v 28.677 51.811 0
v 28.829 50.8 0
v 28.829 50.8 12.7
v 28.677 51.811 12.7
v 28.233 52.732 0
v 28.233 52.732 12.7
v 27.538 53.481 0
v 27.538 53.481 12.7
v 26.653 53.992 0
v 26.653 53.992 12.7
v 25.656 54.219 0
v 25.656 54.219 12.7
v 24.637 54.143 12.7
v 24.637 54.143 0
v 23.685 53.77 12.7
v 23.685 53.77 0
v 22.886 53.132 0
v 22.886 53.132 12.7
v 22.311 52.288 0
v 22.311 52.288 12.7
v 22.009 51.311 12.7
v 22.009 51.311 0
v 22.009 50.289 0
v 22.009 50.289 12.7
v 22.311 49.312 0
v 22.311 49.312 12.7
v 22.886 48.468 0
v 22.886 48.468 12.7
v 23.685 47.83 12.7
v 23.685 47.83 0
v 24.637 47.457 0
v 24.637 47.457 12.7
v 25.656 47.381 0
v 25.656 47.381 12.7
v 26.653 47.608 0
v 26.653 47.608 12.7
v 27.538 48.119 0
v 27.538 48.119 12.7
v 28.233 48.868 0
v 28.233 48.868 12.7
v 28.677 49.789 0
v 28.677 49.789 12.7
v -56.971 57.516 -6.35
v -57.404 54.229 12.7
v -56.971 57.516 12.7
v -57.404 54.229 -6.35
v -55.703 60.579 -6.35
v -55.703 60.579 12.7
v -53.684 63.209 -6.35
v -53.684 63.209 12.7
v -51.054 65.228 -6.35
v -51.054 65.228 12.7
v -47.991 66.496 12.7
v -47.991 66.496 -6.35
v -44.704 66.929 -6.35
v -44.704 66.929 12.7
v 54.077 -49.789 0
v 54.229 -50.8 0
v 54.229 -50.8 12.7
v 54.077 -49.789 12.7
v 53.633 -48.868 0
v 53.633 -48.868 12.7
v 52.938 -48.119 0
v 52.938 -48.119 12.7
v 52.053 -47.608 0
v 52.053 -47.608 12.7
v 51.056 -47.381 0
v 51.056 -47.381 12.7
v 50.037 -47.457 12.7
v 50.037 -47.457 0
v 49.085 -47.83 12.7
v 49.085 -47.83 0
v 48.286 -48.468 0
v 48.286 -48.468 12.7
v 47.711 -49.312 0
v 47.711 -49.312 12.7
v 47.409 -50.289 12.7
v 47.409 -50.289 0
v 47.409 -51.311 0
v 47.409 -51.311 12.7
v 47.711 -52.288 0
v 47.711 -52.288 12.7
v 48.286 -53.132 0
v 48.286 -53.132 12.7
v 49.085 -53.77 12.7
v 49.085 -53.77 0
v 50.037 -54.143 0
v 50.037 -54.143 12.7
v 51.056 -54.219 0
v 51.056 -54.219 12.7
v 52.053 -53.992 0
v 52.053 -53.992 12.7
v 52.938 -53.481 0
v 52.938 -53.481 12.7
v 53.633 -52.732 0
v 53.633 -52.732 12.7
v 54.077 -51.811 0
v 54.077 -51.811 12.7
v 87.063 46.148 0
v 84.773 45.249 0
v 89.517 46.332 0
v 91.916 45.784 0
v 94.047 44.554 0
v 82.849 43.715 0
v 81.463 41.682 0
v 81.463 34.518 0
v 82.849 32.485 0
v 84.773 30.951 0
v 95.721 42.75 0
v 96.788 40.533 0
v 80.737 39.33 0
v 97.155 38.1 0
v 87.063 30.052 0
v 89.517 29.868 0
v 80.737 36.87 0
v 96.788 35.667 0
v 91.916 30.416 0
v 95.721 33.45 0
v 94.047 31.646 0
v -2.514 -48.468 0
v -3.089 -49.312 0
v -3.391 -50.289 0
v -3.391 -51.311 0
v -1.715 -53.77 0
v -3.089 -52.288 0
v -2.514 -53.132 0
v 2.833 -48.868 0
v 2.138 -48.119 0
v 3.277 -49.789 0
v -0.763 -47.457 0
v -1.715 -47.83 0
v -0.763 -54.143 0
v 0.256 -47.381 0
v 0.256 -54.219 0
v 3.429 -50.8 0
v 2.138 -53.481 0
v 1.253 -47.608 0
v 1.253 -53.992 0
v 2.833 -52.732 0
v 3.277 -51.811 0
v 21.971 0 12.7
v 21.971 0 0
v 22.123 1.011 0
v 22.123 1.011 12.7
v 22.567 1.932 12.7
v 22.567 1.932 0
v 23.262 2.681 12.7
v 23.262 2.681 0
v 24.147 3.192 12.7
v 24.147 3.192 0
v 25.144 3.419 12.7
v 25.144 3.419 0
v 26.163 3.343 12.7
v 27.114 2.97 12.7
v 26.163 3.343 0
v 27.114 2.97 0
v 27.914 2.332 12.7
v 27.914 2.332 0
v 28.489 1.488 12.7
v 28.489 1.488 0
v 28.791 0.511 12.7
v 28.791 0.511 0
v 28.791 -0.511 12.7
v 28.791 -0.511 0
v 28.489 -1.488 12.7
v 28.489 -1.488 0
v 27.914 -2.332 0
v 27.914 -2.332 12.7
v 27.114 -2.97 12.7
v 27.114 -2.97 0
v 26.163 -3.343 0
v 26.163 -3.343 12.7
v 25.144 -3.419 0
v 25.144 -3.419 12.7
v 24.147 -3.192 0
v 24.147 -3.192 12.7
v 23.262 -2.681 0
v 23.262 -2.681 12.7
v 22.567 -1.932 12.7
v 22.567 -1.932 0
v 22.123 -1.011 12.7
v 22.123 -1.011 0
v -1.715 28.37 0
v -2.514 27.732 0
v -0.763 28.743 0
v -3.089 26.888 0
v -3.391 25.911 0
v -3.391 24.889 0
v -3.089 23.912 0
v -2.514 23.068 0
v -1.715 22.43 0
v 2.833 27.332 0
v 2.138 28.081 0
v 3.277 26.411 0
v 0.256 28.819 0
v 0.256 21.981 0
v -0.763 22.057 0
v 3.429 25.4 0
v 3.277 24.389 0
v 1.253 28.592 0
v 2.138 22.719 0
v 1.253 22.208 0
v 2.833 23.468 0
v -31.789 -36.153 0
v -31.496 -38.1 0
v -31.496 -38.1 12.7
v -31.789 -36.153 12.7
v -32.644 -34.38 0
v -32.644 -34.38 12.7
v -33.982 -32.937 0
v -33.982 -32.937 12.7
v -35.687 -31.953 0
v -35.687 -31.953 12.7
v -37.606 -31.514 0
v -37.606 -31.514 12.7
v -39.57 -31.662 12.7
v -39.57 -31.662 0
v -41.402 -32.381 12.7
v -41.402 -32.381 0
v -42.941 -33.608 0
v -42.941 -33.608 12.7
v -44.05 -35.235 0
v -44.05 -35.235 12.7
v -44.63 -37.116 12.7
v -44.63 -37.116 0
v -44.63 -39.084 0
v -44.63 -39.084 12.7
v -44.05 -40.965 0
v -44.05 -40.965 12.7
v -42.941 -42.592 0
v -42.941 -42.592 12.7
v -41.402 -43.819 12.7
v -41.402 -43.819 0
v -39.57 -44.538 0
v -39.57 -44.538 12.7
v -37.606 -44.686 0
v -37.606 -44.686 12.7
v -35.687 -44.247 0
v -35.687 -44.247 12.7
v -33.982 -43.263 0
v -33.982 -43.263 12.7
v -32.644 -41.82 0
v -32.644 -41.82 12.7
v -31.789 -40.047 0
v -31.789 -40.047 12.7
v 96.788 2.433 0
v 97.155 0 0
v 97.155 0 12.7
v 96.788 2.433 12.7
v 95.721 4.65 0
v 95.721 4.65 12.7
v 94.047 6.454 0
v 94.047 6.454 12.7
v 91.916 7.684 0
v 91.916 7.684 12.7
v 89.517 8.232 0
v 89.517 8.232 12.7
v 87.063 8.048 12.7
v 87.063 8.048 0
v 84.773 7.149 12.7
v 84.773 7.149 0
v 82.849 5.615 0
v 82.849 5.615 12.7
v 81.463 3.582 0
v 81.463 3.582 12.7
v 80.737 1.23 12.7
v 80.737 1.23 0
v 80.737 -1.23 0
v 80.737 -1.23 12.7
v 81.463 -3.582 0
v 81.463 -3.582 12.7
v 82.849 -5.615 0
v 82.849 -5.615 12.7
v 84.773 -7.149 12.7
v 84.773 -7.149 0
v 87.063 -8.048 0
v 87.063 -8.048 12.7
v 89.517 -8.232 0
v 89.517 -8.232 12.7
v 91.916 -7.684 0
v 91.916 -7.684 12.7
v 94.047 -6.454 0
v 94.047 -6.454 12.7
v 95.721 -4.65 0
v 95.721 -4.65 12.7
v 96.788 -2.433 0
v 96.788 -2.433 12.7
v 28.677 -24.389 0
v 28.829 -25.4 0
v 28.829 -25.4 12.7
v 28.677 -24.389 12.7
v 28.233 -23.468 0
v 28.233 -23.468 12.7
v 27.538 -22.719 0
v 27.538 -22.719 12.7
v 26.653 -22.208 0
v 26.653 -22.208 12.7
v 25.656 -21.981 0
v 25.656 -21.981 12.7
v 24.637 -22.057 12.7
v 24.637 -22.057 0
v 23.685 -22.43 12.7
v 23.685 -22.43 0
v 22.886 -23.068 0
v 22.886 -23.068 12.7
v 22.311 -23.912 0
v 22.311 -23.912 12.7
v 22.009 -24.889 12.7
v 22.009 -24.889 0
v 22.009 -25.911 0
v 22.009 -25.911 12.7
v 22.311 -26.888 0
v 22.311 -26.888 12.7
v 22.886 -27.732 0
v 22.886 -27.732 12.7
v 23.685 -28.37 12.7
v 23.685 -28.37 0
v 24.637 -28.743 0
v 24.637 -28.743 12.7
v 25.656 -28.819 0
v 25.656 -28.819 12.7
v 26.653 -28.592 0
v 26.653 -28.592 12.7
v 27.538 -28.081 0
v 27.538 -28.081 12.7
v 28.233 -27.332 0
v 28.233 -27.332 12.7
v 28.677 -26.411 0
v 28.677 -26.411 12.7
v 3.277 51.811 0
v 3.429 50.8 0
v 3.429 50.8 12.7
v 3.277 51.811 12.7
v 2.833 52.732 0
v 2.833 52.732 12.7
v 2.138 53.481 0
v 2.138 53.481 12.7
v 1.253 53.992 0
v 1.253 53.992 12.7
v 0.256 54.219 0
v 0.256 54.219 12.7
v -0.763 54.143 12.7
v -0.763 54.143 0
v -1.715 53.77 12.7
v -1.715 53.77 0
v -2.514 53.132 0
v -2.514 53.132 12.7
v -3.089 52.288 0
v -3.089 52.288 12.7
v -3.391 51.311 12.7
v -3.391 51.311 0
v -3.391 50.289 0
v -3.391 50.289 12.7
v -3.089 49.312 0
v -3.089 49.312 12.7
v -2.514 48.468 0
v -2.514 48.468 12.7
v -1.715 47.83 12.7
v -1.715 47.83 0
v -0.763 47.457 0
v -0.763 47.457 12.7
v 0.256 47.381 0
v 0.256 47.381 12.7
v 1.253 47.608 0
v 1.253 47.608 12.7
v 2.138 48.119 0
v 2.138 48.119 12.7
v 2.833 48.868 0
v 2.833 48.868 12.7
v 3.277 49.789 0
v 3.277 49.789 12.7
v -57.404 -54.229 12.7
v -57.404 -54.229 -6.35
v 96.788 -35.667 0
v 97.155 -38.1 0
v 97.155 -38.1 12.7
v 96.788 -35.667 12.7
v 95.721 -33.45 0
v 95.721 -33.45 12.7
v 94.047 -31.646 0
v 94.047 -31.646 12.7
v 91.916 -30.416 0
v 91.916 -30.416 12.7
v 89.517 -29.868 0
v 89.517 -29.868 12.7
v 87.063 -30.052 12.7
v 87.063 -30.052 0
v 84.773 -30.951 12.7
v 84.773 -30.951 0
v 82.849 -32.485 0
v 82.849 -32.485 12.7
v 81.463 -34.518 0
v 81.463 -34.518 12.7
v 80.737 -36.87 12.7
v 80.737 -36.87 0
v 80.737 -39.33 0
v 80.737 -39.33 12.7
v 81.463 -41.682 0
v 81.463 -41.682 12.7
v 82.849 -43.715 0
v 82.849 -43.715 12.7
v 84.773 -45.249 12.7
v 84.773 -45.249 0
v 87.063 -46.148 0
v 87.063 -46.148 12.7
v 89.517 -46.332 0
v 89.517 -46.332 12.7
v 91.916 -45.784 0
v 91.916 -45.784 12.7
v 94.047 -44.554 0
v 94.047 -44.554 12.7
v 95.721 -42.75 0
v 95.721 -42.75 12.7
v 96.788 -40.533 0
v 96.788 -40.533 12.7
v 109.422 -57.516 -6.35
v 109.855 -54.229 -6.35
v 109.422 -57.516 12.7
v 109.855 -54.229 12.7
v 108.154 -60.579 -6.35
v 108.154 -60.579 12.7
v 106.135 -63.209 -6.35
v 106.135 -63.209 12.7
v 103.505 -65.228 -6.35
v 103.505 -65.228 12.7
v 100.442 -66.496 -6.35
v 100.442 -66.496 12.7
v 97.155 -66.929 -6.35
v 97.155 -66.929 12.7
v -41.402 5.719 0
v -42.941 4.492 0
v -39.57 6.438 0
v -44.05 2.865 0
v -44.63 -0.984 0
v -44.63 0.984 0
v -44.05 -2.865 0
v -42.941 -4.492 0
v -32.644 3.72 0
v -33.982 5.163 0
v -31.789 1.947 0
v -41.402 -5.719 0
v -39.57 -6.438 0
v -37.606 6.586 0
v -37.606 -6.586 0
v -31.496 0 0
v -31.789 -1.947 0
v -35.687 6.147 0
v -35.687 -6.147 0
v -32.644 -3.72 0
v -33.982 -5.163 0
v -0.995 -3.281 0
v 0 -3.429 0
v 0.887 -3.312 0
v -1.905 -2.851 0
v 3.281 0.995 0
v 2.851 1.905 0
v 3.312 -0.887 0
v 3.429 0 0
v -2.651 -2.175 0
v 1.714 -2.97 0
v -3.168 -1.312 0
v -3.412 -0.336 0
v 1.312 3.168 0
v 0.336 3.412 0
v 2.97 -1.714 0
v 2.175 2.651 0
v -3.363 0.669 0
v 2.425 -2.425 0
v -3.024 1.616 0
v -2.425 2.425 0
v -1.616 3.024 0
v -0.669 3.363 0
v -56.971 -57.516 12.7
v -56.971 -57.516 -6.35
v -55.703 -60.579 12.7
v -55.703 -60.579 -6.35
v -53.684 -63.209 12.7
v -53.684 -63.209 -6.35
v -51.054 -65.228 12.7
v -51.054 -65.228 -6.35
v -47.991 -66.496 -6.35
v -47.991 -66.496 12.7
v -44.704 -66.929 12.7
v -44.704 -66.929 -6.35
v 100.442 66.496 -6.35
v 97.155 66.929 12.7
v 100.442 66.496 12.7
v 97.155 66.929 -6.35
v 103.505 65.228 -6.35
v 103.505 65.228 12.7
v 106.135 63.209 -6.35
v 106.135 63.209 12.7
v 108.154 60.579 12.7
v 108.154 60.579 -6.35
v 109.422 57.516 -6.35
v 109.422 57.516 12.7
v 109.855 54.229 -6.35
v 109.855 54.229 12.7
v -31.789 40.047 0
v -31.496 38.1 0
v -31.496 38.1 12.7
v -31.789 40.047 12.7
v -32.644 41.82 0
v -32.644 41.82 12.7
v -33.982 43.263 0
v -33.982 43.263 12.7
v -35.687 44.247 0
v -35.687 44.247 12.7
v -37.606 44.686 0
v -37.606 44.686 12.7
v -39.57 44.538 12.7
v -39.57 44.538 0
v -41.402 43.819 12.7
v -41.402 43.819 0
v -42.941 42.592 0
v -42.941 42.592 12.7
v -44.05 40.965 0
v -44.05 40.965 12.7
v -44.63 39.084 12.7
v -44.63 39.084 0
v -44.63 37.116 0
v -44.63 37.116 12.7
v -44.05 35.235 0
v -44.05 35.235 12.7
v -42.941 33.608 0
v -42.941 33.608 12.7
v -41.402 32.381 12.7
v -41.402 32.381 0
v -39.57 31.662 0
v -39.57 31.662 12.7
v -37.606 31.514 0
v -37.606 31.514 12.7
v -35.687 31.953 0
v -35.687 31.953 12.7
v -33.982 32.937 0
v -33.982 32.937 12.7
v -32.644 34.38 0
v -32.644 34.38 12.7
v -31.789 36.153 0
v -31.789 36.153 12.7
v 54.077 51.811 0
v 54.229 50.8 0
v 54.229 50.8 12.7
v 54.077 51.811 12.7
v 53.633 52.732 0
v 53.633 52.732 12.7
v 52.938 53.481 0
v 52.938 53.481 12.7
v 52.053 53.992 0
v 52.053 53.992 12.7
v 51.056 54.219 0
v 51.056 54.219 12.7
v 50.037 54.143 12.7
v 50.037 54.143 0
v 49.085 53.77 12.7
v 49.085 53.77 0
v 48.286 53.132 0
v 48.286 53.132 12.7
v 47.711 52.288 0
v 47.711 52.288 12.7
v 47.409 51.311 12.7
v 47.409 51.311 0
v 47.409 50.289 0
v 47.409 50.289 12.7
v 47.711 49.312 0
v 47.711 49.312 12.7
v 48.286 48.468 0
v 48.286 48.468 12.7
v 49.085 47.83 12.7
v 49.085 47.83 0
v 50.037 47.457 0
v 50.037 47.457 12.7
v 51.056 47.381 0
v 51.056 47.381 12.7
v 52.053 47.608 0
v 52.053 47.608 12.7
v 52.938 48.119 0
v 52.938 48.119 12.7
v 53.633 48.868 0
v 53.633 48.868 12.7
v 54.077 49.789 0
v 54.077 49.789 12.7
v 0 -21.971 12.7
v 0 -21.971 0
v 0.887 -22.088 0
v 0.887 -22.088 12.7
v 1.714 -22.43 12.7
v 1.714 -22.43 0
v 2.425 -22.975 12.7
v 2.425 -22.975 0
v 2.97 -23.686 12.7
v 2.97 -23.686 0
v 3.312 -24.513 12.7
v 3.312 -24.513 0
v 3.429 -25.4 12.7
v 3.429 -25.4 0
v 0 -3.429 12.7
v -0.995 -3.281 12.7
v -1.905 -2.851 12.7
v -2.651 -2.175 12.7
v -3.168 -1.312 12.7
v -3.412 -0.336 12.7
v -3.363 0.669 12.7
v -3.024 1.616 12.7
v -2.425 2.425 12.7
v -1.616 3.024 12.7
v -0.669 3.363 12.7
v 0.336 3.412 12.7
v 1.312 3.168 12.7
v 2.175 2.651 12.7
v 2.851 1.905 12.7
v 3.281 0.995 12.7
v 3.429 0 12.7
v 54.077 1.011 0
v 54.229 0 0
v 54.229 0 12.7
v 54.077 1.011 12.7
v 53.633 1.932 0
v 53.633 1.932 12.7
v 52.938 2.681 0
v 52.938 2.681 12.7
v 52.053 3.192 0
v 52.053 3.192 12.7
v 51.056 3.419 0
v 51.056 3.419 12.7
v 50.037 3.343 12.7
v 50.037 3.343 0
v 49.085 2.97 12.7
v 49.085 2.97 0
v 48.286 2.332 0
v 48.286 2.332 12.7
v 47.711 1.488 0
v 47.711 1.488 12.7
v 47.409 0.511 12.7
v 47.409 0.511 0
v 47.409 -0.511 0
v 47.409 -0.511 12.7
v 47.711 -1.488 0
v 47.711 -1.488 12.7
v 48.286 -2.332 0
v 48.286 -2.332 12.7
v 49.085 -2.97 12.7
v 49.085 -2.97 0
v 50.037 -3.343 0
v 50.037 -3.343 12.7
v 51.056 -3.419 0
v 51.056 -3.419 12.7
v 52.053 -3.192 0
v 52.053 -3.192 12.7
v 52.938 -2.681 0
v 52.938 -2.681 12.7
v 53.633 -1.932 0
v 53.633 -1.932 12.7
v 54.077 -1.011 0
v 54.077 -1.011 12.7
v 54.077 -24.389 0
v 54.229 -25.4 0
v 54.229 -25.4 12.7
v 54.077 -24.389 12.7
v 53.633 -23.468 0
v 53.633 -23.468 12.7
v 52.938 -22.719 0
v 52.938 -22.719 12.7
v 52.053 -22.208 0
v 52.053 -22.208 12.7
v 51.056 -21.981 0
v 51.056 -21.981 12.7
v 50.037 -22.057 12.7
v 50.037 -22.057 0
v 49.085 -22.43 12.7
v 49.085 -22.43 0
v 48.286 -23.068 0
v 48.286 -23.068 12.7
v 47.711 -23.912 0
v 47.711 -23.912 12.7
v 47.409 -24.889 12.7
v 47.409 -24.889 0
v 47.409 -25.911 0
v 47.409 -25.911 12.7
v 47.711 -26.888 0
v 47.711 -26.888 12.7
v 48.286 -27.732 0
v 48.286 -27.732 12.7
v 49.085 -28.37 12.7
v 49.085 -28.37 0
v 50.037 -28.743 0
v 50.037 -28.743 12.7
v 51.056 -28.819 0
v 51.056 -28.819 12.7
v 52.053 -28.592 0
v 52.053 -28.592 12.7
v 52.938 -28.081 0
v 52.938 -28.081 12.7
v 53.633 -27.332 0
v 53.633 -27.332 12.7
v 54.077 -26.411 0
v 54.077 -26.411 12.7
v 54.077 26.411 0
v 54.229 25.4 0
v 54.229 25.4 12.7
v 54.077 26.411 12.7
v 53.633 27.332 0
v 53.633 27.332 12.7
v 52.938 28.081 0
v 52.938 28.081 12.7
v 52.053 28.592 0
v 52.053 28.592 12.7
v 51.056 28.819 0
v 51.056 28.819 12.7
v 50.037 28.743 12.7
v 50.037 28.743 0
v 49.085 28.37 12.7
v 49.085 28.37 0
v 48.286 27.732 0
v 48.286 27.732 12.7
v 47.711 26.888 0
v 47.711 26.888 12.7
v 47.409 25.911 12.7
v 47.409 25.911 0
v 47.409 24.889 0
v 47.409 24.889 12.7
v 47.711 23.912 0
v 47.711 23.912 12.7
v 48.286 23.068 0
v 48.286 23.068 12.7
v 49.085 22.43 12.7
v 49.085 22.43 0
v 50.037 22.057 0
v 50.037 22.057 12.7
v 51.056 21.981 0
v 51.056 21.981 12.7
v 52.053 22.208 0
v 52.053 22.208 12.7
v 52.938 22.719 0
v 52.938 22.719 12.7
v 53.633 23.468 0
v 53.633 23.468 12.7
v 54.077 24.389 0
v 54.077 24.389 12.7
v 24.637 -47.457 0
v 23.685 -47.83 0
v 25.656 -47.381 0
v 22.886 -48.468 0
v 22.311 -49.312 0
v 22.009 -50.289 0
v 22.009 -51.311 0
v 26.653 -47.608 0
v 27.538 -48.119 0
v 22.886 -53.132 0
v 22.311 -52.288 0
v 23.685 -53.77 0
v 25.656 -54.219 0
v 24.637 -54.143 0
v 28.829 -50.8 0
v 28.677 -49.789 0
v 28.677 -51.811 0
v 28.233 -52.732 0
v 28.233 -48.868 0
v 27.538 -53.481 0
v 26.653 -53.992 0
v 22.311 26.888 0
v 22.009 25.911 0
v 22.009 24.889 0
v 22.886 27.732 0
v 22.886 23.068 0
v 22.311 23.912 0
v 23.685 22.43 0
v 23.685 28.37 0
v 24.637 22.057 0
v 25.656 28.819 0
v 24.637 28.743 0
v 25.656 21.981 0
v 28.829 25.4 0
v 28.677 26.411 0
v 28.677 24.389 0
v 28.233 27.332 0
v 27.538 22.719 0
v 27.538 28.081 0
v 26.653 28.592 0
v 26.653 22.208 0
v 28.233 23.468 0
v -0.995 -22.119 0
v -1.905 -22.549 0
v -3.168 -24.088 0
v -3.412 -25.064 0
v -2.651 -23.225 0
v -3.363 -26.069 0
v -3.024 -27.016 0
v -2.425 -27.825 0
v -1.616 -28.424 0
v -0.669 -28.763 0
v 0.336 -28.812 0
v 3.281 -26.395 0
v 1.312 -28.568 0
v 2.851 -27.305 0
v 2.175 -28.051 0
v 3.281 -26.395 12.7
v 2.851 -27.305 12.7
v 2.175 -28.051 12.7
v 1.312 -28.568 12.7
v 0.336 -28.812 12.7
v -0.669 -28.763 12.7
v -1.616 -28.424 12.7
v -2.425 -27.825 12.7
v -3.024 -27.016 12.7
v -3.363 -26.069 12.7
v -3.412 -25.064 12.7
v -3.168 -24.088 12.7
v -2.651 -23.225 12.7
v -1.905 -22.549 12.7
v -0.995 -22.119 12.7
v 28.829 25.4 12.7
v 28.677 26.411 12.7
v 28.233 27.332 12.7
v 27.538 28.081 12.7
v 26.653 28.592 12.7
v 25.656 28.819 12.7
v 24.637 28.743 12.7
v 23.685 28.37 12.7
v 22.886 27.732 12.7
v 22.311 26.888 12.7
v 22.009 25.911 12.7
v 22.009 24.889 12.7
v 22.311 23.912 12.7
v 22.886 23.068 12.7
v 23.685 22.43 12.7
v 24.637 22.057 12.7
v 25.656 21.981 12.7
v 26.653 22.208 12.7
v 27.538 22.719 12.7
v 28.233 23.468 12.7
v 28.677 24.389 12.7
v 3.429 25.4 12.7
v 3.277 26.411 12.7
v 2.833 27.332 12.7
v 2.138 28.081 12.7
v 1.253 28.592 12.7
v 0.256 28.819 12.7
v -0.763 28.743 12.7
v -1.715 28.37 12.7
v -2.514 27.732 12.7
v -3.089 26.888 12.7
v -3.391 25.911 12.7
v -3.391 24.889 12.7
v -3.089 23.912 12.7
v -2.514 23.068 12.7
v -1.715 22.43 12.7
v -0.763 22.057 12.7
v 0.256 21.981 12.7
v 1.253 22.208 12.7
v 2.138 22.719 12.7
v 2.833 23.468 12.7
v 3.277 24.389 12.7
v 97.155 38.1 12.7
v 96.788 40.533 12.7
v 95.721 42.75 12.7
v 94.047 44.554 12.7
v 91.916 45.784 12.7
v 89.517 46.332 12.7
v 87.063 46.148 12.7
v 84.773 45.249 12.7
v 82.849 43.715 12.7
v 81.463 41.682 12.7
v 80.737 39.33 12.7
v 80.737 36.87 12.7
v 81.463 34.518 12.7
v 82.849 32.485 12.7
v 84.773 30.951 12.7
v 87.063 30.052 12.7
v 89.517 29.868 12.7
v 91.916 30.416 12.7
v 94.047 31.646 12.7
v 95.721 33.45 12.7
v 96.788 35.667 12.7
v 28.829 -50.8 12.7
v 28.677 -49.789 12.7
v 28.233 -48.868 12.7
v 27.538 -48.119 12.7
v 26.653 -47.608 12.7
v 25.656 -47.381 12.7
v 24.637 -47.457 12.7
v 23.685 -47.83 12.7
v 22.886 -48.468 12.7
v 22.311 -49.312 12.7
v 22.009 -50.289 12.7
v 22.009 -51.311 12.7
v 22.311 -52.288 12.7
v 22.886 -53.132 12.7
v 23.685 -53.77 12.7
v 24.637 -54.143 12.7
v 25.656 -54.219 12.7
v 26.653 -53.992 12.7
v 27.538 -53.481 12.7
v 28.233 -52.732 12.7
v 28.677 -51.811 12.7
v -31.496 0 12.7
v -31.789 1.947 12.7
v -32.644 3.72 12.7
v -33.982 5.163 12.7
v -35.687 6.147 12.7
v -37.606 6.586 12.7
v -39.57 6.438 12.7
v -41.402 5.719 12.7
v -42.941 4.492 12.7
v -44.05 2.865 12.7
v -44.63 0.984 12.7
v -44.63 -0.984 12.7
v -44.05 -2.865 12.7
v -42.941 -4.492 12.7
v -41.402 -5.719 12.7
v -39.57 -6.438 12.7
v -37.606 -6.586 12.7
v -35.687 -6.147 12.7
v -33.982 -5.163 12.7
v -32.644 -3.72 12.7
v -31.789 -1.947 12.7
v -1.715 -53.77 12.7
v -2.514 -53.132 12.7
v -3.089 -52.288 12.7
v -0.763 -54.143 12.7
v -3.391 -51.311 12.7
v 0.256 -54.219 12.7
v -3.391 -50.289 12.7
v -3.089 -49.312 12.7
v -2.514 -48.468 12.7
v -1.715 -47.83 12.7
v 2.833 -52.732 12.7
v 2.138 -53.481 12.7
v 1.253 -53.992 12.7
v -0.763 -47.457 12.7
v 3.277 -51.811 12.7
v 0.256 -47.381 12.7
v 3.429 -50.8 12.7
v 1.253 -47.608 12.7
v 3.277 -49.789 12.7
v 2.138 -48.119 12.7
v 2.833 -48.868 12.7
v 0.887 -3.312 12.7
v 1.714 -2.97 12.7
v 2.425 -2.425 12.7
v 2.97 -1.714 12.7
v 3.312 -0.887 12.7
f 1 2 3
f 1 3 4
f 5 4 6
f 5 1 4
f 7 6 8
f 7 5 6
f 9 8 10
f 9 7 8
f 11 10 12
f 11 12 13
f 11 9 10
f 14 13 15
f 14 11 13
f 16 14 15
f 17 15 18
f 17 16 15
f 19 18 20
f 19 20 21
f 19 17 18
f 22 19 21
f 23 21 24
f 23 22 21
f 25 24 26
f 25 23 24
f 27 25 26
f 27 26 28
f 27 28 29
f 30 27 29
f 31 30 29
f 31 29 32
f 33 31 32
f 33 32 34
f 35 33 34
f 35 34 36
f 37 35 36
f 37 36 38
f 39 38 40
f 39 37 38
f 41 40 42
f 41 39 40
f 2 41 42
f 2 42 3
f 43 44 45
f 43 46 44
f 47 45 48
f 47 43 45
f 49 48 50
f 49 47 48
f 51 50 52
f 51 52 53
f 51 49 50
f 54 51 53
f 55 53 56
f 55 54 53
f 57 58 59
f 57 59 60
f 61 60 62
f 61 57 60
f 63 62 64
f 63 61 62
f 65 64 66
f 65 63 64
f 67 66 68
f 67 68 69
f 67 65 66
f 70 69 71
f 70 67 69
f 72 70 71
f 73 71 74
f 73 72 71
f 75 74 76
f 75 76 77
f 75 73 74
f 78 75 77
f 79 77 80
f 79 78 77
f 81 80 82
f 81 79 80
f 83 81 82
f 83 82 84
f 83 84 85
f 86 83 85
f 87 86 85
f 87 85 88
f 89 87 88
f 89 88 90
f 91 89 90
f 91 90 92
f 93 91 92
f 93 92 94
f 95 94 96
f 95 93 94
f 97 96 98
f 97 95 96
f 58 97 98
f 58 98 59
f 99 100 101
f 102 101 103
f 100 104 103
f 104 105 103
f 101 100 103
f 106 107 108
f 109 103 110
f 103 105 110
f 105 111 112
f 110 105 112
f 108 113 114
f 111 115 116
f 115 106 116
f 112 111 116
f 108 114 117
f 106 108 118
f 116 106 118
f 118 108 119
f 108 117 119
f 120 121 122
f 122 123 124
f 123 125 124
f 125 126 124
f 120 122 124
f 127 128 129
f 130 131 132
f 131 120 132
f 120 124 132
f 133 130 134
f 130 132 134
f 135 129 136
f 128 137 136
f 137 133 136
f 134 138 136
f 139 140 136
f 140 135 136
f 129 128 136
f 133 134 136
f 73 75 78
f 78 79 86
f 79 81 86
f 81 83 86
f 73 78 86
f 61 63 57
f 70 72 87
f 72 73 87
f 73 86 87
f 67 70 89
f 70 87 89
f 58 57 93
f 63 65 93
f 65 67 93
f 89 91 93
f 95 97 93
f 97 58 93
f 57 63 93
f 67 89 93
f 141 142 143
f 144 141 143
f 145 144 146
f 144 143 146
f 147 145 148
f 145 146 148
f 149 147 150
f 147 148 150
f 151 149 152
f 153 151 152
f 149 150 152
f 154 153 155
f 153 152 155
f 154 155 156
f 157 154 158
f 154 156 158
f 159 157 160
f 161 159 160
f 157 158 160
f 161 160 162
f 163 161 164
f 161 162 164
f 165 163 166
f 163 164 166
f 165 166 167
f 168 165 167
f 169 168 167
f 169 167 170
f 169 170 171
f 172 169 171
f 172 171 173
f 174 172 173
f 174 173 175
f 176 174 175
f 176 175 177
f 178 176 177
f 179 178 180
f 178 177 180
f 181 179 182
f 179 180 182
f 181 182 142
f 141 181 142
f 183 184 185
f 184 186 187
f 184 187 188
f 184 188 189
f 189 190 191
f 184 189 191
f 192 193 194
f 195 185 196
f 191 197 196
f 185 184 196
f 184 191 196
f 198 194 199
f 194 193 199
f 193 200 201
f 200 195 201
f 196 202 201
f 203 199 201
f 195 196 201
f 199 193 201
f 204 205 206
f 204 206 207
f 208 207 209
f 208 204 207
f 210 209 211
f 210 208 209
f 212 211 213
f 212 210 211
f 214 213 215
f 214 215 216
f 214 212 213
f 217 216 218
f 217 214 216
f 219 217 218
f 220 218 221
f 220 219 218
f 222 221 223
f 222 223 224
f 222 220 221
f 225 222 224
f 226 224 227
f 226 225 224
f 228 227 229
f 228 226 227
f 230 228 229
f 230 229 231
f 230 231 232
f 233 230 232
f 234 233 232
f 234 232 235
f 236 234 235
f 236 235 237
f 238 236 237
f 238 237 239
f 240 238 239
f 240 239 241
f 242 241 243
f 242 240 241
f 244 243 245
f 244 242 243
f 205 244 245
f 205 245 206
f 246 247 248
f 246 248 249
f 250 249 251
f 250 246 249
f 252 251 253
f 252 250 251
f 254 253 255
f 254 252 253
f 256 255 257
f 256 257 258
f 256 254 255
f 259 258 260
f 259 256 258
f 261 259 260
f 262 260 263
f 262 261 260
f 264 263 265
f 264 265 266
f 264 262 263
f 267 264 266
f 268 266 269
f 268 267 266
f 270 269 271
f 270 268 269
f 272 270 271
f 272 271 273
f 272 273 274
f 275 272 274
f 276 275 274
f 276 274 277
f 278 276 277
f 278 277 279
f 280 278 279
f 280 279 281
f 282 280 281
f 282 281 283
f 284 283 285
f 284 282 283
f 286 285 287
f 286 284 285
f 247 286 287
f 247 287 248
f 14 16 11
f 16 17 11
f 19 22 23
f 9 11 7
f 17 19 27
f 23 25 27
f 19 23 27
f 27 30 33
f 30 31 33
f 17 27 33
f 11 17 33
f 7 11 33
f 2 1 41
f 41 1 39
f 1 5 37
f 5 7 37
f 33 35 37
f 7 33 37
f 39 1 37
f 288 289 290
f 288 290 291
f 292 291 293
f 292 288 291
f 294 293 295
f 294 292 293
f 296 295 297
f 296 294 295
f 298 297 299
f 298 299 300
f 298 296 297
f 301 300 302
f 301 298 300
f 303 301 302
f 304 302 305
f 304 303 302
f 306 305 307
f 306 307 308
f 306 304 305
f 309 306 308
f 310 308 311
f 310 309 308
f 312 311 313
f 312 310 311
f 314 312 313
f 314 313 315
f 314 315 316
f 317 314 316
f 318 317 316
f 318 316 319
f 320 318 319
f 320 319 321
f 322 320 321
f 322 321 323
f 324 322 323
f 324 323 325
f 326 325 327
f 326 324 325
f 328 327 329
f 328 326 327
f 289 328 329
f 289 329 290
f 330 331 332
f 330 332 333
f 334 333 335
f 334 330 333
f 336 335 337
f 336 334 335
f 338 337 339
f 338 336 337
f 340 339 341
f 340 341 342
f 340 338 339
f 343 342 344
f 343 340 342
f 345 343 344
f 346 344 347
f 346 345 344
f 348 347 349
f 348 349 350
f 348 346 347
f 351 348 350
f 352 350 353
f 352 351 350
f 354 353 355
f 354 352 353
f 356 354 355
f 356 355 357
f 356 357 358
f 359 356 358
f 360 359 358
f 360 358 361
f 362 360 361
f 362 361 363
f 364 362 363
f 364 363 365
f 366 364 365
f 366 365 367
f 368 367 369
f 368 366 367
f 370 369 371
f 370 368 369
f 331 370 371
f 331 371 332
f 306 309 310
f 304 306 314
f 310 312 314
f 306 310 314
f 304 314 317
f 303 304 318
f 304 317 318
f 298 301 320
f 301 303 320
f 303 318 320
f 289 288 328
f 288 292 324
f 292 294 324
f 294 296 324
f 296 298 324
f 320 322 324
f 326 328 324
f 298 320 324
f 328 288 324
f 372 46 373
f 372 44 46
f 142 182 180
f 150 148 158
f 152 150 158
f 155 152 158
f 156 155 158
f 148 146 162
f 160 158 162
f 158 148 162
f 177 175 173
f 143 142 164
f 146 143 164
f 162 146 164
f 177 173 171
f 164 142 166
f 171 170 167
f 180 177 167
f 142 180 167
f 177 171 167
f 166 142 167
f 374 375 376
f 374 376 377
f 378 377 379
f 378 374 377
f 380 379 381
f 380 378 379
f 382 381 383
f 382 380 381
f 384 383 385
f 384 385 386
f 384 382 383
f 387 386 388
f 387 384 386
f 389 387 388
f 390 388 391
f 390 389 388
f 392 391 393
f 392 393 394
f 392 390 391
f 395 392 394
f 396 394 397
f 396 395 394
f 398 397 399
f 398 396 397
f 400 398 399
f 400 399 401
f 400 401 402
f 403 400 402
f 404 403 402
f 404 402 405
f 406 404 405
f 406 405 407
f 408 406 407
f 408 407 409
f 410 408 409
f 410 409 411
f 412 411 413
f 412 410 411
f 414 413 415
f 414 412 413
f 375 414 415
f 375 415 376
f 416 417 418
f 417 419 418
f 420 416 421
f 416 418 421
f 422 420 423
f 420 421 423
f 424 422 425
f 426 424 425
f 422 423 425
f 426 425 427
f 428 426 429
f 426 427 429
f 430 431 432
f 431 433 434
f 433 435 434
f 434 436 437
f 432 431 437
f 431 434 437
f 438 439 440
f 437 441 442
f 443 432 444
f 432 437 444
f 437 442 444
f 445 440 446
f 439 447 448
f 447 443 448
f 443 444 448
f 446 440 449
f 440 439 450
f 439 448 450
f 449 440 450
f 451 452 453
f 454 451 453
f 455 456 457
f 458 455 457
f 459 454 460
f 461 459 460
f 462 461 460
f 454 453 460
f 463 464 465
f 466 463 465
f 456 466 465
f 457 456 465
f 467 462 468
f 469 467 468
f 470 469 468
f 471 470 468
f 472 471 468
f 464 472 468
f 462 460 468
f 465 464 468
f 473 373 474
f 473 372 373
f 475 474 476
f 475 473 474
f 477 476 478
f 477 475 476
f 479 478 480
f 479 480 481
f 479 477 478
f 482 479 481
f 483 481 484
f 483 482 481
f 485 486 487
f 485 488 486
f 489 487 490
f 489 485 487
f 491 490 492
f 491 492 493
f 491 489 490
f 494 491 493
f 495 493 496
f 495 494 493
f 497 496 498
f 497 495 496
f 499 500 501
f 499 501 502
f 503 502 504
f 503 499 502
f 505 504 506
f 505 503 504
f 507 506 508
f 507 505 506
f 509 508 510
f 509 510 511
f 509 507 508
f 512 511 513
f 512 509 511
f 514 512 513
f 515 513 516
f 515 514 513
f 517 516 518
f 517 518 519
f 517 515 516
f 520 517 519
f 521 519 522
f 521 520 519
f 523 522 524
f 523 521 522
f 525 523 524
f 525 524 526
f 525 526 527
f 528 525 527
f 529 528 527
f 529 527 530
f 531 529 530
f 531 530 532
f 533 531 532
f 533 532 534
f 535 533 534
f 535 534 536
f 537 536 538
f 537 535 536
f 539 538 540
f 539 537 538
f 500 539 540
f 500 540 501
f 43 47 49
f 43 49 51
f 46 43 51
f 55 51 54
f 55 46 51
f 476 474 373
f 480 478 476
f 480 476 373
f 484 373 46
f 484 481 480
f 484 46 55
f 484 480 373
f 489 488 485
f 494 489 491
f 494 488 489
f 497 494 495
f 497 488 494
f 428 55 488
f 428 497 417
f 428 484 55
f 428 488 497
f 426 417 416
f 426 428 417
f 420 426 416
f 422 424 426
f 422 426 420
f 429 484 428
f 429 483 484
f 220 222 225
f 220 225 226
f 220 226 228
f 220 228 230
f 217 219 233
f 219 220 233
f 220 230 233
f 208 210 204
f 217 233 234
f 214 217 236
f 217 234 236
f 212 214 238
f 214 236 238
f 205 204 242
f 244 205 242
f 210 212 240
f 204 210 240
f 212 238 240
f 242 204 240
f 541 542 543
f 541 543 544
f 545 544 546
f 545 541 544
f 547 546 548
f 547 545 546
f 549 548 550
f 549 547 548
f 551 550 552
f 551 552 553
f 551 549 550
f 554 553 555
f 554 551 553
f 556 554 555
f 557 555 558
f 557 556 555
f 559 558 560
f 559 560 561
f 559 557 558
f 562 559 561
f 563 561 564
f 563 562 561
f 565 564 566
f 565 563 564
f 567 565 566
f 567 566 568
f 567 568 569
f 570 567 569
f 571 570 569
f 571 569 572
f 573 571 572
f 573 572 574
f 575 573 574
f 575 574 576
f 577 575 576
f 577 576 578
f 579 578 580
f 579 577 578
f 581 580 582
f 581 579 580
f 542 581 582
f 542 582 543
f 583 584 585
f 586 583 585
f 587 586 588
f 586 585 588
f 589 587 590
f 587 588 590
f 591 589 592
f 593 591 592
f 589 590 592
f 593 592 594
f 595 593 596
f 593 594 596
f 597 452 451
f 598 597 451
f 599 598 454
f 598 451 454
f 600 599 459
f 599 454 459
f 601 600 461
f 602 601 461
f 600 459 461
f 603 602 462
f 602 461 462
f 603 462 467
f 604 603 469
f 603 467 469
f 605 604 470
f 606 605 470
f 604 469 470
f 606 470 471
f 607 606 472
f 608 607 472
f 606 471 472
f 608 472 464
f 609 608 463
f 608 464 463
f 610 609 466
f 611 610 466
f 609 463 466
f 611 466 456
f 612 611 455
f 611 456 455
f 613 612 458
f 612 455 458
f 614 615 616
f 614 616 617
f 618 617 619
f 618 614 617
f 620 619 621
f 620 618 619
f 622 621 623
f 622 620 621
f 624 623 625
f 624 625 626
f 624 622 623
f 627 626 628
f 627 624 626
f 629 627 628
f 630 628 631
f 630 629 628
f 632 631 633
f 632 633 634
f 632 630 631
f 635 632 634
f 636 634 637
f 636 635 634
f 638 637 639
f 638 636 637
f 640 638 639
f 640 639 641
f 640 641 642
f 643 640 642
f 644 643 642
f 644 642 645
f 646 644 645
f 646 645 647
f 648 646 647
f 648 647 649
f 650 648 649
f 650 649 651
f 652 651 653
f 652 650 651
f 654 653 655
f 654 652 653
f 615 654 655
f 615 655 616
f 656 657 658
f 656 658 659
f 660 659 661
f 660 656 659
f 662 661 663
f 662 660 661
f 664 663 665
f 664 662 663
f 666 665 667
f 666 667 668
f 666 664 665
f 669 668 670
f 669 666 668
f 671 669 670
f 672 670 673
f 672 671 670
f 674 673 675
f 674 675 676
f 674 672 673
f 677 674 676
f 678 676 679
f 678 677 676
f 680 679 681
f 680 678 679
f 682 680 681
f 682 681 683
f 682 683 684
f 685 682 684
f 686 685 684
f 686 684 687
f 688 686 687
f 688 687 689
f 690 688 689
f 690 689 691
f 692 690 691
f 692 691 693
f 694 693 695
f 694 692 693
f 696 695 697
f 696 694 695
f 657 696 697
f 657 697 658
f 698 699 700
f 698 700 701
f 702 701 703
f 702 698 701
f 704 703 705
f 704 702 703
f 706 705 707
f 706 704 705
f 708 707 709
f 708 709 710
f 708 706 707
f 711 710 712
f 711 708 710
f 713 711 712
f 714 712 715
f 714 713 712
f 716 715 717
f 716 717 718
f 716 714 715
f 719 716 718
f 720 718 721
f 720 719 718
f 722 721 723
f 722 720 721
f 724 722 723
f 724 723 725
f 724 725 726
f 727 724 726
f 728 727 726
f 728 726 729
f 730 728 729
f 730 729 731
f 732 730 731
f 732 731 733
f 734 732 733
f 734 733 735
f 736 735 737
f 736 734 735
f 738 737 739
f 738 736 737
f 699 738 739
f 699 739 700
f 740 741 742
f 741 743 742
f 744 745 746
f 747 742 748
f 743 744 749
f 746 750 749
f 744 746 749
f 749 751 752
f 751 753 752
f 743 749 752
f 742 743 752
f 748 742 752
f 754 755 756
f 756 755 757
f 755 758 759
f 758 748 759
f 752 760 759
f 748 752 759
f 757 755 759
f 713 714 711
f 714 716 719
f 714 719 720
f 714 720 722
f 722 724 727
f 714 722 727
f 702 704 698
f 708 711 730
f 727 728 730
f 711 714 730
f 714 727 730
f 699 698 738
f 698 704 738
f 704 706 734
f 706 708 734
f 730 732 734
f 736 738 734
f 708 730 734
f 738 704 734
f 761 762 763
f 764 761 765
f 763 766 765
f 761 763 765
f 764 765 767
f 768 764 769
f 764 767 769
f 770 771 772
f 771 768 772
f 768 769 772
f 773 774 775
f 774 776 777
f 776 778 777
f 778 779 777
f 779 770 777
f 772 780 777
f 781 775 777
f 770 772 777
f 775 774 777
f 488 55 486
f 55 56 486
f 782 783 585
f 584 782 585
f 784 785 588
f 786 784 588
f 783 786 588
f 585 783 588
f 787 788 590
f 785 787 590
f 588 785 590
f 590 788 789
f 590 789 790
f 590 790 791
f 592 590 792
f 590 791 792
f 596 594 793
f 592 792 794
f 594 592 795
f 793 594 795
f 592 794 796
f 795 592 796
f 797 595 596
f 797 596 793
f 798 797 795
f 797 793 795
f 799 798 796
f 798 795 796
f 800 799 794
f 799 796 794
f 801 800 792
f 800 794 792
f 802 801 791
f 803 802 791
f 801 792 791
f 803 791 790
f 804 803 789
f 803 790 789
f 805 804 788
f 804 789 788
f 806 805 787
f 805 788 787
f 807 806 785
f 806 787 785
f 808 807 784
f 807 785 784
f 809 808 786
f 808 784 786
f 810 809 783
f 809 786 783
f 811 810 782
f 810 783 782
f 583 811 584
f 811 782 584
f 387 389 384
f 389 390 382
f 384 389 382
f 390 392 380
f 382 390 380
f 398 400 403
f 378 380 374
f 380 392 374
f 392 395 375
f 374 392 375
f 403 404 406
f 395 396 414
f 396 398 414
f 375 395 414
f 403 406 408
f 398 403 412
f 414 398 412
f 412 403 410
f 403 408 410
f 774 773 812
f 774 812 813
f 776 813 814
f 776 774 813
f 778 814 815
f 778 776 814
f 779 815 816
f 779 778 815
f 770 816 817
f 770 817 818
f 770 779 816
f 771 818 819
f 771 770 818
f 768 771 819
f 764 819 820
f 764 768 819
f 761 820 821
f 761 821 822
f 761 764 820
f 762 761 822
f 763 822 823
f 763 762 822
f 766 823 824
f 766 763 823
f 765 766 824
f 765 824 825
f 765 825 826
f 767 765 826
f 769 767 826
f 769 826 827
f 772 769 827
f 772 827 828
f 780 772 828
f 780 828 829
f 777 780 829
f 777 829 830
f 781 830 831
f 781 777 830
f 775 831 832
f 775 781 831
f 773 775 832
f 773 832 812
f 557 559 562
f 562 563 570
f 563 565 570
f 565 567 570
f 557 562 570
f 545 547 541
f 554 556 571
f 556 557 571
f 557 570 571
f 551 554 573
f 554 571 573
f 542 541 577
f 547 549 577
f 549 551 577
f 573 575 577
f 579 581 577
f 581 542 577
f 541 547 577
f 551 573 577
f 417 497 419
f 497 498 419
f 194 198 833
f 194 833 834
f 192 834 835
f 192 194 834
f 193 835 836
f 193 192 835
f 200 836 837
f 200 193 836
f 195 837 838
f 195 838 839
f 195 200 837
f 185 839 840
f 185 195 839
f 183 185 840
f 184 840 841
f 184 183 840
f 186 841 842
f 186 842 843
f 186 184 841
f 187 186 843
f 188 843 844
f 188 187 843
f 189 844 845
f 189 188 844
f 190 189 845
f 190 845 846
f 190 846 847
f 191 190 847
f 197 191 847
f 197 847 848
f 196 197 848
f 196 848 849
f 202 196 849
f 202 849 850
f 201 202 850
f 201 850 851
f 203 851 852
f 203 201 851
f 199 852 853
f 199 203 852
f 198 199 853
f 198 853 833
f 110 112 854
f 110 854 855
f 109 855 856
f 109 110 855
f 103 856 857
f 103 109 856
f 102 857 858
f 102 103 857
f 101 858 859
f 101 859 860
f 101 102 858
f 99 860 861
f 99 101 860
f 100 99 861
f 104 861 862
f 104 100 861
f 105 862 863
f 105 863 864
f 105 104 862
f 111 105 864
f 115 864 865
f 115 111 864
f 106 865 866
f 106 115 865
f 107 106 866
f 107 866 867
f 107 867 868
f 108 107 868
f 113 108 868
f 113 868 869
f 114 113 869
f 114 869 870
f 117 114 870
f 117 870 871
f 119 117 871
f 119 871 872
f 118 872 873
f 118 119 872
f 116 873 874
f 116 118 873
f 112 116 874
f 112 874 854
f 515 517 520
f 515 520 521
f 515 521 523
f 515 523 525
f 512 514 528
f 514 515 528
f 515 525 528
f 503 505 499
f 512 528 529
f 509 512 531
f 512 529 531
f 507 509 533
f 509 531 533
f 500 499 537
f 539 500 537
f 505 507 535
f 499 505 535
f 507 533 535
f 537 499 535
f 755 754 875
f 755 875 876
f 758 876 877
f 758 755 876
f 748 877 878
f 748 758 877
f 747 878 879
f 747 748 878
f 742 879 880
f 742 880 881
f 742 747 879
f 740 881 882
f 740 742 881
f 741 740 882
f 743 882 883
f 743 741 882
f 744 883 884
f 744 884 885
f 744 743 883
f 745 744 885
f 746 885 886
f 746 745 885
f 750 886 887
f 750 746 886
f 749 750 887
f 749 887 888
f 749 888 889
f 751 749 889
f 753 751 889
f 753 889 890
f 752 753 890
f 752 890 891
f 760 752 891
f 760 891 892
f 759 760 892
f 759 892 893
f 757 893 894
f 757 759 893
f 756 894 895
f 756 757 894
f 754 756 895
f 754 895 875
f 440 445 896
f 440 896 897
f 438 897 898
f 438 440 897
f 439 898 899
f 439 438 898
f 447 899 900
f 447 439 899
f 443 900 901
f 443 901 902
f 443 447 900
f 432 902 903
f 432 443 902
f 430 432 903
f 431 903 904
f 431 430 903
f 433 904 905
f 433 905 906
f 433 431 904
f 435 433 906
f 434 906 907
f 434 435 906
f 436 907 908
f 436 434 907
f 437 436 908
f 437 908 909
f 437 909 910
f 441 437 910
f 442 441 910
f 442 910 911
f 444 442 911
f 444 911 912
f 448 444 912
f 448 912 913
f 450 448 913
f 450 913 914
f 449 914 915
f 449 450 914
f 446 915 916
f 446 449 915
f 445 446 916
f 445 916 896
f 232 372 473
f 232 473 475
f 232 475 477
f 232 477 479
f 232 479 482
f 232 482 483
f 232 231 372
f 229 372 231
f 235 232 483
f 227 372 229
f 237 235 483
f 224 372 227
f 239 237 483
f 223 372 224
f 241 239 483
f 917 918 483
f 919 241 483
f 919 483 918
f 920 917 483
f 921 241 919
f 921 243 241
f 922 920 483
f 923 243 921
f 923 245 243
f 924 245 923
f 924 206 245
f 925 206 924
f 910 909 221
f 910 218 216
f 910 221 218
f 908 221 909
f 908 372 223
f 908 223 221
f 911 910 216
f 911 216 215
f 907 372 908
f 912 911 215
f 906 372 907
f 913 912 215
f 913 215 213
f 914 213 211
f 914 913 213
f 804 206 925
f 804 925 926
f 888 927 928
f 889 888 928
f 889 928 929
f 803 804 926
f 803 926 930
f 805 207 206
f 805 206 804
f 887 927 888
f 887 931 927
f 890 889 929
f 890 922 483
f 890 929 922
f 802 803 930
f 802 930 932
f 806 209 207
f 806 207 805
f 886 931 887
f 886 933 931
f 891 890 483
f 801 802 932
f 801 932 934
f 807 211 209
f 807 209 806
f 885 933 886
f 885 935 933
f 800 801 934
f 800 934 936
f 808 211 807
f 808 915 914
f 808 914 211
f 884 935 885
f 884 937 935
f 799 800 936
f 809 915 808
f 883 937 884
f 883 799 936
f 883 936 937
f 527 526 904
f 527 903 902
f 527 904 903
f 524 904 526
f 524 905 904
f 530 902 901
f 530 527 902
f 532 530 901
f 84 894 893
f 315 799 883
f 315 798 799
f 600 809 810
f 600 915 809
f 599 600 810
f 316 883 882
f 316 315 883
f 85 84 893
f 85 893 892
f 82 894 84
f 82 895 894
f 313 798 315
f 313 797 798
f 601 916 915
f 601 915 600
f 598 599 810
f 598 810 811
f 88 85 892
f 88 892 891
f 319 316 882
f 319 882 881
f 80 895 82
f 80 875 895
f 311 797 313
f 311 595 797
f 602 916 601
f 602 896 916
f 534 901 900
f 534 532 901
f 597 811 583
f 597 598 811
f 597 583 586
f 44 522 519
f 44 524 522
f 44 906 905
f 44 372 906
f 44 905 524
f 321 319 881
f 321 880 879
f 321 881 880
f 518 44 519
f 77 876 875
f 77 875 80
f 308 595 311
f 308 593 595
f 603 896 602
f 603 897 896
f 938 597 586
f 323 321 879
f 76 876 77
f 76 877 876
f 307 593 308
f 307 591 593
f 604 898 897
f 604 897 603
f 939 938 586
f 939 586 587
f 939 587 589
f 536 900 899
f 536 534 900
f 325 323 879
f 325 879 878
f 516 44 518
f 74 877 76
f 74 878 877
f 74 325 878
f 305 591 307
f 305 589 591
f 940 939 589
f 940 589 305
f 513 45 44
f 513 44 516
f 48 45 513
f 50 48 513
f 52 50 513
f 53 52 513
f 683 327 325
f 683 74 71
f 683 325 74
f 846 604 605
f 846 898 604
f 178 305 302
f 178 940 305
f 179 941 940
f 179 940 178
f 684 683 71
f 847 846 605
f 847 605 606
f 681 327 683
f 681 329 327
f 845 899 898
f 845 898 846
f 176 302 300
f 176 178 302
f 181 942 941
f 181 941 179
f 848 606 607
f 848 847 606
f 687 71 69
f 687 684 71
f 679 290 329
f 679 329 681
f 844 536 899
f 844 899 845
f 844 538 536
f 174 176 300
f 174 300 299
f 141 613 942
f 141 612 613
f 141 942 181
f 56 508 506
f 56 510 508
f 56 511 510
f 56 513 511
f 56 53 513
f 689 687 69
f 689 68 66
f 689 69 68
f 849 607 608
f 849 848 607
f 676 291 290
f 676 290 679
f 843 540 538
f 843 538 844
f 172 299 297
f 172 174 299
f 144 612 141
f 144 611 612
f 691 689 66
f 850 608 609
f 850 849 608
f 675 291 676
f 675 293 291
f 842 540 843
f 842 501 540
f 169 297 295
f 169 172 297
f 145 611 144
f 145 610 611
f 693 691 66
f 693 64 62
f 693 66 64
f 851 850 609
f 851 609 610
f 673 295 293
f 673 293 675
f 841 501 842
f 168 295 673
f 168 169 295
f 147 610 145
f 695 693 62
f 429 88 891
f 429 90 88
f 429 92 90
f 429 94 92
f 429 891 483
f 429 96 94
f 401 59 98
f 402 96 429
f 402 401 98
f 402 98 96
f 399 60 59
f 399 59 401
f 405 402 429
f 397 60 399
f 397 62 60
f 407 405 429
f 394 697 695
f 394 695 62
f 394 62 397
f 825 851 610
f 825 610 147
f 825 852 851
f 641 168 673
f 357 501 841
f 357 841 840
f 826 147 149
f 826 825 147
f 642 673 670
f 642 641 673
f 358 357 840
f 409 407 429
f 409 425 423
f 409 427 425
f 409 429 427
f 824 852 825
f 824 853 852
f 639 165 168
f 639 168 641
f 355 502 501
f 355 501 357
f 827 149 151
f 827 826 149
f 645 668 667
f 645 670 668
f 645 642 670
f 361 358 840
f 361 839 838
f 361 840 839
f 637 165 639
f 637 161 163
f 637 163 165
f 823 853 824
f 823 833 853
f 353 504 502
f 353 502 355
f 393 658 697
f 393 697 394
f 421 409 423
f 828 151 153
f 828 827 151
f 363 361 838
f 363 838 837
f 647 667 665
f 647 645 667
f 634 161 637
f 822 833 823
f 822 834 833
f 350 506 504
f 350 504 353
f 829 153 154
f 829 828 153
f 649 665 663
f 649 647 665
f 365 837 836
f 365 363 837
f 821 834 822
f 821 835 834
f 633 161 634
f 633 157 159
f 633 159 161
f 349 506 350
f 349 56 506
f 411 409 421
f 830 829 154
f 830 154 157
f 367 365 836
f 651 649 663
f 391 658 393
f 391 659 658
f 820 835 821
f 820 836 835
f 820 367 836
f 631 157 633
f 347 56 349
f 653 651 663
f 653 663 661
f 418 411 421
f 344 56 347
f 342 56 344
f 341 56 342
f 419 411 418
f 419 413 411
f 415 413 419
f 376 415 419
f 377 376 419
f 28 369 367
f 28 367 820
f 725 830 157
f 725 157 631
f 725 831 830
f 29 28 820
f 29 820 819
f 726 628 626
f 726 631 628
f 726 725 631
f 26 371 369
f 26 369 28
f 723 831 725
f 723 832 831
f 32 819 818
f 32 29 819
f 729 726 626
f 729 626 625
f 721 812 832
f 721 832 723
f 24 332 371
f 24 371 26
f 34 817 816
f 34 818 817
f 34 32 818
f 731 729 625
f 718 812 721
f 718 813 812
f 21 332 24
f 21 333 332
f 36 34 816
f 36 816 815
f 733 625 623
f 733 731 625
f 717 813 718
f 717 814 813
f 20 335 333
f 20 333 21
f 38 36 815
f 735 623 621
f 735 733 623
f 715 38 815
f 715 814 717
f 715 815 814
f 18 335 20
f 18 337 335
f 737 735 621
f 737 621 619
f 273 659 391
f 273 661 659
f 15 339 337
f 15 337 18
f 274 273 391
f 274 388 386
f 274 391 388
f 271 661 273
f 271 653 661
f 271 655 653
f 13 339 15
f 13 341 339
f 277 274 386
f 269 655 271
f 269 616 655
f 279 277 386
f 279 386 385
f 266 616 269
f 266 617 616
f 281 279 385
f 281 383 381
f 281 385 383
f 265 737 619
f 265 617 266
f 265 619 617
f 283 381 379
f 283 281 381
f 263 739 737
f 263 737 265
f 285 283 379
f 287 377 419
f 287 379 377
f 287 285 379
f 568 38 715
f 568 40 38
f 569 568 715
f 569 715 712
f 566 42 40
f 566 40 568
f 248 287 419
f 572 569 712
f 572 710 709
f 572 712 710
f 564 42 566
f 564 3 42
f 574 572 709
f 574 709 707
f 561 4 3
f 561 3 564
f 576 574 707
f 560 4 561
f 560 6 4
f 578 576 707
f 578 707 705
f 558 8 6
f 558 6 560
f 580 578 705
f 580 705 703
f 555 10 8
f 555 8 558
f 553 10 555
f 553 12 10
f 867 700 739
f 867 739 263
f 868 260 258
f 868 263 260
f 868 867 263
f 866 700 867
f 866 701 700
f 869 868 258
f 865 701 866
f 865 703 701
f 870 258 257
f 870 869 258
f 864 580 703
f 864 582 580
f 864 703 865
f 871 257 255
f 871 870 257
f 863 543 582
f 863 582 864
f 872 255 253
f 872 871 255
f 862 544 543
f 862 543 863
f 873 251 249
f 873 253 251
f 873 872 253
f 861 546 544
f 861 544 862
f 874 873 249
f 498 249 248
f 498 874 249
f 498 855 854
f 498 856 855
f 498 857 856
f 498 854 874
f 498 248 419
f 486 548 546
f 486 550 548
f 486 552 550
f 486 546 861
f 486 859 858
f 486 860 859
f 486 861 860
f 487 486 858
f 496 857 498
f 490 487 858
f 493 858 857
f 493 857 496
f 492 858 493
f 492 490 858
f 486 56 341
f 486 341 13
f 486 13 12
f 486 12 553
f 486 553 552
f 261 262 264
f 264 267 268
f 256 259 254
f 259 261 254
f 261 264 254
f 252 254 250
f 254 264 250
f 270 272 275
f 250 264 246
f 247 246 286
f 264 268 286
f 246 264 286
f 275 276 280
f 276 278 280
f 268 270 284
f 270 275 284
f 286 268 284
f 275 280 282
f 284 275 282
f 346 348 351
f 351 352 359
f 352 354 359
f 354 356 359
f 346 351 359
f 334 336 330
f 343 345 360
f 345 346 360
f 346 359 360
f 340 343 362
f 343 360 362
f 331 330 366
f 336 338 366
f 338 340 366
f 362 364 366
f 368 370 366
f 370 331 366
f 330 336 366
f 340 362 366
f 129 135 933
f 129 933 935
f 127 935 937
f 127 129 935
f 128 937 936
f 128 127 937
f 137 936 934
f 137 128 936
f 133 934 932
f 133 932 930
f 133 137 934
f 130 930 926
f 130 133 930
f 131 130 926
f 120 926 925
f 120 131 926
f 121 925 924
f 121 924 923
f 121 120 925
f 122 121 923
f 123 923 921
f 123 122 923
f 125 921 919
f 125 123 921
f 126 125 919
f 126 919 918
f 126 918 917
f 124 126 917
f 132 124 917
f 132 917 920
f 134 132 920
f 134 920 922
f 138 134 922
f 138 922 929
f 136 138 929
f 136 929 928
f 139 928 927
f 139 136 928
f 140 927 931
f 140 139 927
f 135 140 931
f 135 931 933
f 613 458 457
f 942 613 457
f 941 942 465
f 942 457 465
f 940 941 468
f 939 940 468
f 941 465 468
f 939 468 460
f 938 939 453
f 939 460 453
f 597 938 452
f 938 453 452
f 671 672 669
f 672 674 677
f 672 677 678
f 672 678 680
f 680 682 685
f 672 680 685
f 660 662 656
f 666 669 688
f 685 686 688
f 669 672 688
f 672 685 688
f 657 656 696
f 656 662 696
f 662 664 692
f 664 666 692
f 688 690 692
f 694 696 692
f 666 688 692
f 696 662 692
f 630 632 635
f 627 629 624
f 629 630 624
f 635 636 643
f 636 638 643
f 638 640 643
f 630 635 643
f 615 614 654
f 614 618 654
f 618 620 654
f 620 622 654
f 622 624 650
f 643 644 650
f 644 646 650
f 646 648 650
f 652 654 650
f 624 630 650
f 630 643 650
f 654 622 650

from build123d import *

# Parameters (mm, degrees)
F0_W     = 167.259
F0_H     = 133.858
F0_R     = 6.604
F0_R_2   = 3.429
F0_R_3   = 8.255
F1_DEPTH = 12.7
F2_W     = 167.259
F2_H     = 133.858
F3_DEPTH = 6.35
F4_R     = 12.7


with BuildPart() as f1:
    # F0 (on Top) → F1 (new body)
    with BuildSketch(Plane.XY):
        with Locations((26.2255, 0)):
            Rectangle(F0_W, F0_H)
        with Locations((-38.1, -38.1)):
            Circle(F0_R, mode=Mode.SUBTRACT)
        with Locations((0, -50.8)):
            Circle(F0_R_2, mode=Mode.SUBTRACT)
        with Locations((25.4, -50.8)):
            Circle(F0_R_2, mode=Mode.SUBTRACT)
        with BuildLine():
            ThreePointArc((3.429, -25.4), (-2.424669, -27.824669), (0, -21.971))
            ThreePointArc((0, -21.971), (2.424669, -22.975331), (3.429, -25.4))
        make_face(mode=Mode.SUBTRACT)
        with Locations((25.4, -25.4)):
            Circle(F0_R_2, mode=Mode.SUBTRACT)
        with Locations((50.8, -50.8)):
            Circle(F0_R_2, mode=Mode.SUBTRACT)
        with Locations((88.9, -38.1)):
            Circle(F0_R_3, mode=Mode.SUBTRACT)
        with Locations((50.8, -25.4)):
            Circle(F0_R_2, mode=Mode.SUBTRACT)
        with Locations((-38.1, 0)):
            Circle(F0_R, mode=Mode.SUBTRACT)
        with BuildLine():
            ThreePointArc((0, -3.429), (-2.424669, 2.424669), (3.429, 0))
            ThreePointArc((3.429, 0), (2.424669, -2.424669), (0, -3.429))
        make_face(mode=Mode.SUBTRACT)
        with BuildLine():
            ThreePointArc((28.829, 0), (25.4, -3.429), (21.971, 0))
            ThreePointArc((21.971, 0), (25.4, 3.429), (28.829, 0))
        make_face(mode=Mode.SUBTRACT)
        with Locations((0, 25.4)):
            Circle(F0_R_2, mode=Mode.SUBTRACT)
        with Locations((25.4, 25.4)):
            Circle(F0_R_2, mode=Mode.SUBTRACT)
        with Locations((-38.1, 38.1)):
            Circle(F0_R, mode=Mode.SUBTRACT)
        with Locations((0, 50.8)):
            Circle(F0_R_2, mode=Mode.SUBTRACT)
        with Locations((25.4, 50.8)):
            Circle(F0_R_2, mode=Mode.SUBTRACT)
        with Locations((50.8, 0)):
            Circle(F0_R_2, mode=Mode.SUBTRACT)
        with Locations((50.8, 25.4)):
            Circle(F0_R_2, mode=Mode.SUBTRACT)
        with Locations((88.9, 0)):
            Circle(F0_R_3, mode=Mode.SUBTRACT)
        with Locations((50.8, 50.8)):
            Circle(F0_R_2, mode=Mode.SUBTRACT)
        with Locations((88.9, 38.1)):
            Circle(F0_R_3, mode=Mode.SUBTRACT)
    extrude(amount=F1_DEPTH)

    # F2 (on face) → F3 (join)
    with BuildSketch(Plane(origin=(0, 0, 0), x_dir=(1, 0, 0), z_dir=(0, 0, -1))):
        with Locations((26.2255, 0)):
            Rectangle(F2_W, F2_H)
    extrude(amount=F3_DEPTH)

    # F4
    f4_edges = [f1.edges().sort_by_distance(p)[0] for p in [
        (-57.404, -66.929, 3.175),
        (-57.404, 66.929, 3.175),
        (109.855, -66.929, 3.175),
        (109.855, 66.929, 3.175),
    ]]
    fillet(f4_edges, radius=F4_R)


solid = f1.part
